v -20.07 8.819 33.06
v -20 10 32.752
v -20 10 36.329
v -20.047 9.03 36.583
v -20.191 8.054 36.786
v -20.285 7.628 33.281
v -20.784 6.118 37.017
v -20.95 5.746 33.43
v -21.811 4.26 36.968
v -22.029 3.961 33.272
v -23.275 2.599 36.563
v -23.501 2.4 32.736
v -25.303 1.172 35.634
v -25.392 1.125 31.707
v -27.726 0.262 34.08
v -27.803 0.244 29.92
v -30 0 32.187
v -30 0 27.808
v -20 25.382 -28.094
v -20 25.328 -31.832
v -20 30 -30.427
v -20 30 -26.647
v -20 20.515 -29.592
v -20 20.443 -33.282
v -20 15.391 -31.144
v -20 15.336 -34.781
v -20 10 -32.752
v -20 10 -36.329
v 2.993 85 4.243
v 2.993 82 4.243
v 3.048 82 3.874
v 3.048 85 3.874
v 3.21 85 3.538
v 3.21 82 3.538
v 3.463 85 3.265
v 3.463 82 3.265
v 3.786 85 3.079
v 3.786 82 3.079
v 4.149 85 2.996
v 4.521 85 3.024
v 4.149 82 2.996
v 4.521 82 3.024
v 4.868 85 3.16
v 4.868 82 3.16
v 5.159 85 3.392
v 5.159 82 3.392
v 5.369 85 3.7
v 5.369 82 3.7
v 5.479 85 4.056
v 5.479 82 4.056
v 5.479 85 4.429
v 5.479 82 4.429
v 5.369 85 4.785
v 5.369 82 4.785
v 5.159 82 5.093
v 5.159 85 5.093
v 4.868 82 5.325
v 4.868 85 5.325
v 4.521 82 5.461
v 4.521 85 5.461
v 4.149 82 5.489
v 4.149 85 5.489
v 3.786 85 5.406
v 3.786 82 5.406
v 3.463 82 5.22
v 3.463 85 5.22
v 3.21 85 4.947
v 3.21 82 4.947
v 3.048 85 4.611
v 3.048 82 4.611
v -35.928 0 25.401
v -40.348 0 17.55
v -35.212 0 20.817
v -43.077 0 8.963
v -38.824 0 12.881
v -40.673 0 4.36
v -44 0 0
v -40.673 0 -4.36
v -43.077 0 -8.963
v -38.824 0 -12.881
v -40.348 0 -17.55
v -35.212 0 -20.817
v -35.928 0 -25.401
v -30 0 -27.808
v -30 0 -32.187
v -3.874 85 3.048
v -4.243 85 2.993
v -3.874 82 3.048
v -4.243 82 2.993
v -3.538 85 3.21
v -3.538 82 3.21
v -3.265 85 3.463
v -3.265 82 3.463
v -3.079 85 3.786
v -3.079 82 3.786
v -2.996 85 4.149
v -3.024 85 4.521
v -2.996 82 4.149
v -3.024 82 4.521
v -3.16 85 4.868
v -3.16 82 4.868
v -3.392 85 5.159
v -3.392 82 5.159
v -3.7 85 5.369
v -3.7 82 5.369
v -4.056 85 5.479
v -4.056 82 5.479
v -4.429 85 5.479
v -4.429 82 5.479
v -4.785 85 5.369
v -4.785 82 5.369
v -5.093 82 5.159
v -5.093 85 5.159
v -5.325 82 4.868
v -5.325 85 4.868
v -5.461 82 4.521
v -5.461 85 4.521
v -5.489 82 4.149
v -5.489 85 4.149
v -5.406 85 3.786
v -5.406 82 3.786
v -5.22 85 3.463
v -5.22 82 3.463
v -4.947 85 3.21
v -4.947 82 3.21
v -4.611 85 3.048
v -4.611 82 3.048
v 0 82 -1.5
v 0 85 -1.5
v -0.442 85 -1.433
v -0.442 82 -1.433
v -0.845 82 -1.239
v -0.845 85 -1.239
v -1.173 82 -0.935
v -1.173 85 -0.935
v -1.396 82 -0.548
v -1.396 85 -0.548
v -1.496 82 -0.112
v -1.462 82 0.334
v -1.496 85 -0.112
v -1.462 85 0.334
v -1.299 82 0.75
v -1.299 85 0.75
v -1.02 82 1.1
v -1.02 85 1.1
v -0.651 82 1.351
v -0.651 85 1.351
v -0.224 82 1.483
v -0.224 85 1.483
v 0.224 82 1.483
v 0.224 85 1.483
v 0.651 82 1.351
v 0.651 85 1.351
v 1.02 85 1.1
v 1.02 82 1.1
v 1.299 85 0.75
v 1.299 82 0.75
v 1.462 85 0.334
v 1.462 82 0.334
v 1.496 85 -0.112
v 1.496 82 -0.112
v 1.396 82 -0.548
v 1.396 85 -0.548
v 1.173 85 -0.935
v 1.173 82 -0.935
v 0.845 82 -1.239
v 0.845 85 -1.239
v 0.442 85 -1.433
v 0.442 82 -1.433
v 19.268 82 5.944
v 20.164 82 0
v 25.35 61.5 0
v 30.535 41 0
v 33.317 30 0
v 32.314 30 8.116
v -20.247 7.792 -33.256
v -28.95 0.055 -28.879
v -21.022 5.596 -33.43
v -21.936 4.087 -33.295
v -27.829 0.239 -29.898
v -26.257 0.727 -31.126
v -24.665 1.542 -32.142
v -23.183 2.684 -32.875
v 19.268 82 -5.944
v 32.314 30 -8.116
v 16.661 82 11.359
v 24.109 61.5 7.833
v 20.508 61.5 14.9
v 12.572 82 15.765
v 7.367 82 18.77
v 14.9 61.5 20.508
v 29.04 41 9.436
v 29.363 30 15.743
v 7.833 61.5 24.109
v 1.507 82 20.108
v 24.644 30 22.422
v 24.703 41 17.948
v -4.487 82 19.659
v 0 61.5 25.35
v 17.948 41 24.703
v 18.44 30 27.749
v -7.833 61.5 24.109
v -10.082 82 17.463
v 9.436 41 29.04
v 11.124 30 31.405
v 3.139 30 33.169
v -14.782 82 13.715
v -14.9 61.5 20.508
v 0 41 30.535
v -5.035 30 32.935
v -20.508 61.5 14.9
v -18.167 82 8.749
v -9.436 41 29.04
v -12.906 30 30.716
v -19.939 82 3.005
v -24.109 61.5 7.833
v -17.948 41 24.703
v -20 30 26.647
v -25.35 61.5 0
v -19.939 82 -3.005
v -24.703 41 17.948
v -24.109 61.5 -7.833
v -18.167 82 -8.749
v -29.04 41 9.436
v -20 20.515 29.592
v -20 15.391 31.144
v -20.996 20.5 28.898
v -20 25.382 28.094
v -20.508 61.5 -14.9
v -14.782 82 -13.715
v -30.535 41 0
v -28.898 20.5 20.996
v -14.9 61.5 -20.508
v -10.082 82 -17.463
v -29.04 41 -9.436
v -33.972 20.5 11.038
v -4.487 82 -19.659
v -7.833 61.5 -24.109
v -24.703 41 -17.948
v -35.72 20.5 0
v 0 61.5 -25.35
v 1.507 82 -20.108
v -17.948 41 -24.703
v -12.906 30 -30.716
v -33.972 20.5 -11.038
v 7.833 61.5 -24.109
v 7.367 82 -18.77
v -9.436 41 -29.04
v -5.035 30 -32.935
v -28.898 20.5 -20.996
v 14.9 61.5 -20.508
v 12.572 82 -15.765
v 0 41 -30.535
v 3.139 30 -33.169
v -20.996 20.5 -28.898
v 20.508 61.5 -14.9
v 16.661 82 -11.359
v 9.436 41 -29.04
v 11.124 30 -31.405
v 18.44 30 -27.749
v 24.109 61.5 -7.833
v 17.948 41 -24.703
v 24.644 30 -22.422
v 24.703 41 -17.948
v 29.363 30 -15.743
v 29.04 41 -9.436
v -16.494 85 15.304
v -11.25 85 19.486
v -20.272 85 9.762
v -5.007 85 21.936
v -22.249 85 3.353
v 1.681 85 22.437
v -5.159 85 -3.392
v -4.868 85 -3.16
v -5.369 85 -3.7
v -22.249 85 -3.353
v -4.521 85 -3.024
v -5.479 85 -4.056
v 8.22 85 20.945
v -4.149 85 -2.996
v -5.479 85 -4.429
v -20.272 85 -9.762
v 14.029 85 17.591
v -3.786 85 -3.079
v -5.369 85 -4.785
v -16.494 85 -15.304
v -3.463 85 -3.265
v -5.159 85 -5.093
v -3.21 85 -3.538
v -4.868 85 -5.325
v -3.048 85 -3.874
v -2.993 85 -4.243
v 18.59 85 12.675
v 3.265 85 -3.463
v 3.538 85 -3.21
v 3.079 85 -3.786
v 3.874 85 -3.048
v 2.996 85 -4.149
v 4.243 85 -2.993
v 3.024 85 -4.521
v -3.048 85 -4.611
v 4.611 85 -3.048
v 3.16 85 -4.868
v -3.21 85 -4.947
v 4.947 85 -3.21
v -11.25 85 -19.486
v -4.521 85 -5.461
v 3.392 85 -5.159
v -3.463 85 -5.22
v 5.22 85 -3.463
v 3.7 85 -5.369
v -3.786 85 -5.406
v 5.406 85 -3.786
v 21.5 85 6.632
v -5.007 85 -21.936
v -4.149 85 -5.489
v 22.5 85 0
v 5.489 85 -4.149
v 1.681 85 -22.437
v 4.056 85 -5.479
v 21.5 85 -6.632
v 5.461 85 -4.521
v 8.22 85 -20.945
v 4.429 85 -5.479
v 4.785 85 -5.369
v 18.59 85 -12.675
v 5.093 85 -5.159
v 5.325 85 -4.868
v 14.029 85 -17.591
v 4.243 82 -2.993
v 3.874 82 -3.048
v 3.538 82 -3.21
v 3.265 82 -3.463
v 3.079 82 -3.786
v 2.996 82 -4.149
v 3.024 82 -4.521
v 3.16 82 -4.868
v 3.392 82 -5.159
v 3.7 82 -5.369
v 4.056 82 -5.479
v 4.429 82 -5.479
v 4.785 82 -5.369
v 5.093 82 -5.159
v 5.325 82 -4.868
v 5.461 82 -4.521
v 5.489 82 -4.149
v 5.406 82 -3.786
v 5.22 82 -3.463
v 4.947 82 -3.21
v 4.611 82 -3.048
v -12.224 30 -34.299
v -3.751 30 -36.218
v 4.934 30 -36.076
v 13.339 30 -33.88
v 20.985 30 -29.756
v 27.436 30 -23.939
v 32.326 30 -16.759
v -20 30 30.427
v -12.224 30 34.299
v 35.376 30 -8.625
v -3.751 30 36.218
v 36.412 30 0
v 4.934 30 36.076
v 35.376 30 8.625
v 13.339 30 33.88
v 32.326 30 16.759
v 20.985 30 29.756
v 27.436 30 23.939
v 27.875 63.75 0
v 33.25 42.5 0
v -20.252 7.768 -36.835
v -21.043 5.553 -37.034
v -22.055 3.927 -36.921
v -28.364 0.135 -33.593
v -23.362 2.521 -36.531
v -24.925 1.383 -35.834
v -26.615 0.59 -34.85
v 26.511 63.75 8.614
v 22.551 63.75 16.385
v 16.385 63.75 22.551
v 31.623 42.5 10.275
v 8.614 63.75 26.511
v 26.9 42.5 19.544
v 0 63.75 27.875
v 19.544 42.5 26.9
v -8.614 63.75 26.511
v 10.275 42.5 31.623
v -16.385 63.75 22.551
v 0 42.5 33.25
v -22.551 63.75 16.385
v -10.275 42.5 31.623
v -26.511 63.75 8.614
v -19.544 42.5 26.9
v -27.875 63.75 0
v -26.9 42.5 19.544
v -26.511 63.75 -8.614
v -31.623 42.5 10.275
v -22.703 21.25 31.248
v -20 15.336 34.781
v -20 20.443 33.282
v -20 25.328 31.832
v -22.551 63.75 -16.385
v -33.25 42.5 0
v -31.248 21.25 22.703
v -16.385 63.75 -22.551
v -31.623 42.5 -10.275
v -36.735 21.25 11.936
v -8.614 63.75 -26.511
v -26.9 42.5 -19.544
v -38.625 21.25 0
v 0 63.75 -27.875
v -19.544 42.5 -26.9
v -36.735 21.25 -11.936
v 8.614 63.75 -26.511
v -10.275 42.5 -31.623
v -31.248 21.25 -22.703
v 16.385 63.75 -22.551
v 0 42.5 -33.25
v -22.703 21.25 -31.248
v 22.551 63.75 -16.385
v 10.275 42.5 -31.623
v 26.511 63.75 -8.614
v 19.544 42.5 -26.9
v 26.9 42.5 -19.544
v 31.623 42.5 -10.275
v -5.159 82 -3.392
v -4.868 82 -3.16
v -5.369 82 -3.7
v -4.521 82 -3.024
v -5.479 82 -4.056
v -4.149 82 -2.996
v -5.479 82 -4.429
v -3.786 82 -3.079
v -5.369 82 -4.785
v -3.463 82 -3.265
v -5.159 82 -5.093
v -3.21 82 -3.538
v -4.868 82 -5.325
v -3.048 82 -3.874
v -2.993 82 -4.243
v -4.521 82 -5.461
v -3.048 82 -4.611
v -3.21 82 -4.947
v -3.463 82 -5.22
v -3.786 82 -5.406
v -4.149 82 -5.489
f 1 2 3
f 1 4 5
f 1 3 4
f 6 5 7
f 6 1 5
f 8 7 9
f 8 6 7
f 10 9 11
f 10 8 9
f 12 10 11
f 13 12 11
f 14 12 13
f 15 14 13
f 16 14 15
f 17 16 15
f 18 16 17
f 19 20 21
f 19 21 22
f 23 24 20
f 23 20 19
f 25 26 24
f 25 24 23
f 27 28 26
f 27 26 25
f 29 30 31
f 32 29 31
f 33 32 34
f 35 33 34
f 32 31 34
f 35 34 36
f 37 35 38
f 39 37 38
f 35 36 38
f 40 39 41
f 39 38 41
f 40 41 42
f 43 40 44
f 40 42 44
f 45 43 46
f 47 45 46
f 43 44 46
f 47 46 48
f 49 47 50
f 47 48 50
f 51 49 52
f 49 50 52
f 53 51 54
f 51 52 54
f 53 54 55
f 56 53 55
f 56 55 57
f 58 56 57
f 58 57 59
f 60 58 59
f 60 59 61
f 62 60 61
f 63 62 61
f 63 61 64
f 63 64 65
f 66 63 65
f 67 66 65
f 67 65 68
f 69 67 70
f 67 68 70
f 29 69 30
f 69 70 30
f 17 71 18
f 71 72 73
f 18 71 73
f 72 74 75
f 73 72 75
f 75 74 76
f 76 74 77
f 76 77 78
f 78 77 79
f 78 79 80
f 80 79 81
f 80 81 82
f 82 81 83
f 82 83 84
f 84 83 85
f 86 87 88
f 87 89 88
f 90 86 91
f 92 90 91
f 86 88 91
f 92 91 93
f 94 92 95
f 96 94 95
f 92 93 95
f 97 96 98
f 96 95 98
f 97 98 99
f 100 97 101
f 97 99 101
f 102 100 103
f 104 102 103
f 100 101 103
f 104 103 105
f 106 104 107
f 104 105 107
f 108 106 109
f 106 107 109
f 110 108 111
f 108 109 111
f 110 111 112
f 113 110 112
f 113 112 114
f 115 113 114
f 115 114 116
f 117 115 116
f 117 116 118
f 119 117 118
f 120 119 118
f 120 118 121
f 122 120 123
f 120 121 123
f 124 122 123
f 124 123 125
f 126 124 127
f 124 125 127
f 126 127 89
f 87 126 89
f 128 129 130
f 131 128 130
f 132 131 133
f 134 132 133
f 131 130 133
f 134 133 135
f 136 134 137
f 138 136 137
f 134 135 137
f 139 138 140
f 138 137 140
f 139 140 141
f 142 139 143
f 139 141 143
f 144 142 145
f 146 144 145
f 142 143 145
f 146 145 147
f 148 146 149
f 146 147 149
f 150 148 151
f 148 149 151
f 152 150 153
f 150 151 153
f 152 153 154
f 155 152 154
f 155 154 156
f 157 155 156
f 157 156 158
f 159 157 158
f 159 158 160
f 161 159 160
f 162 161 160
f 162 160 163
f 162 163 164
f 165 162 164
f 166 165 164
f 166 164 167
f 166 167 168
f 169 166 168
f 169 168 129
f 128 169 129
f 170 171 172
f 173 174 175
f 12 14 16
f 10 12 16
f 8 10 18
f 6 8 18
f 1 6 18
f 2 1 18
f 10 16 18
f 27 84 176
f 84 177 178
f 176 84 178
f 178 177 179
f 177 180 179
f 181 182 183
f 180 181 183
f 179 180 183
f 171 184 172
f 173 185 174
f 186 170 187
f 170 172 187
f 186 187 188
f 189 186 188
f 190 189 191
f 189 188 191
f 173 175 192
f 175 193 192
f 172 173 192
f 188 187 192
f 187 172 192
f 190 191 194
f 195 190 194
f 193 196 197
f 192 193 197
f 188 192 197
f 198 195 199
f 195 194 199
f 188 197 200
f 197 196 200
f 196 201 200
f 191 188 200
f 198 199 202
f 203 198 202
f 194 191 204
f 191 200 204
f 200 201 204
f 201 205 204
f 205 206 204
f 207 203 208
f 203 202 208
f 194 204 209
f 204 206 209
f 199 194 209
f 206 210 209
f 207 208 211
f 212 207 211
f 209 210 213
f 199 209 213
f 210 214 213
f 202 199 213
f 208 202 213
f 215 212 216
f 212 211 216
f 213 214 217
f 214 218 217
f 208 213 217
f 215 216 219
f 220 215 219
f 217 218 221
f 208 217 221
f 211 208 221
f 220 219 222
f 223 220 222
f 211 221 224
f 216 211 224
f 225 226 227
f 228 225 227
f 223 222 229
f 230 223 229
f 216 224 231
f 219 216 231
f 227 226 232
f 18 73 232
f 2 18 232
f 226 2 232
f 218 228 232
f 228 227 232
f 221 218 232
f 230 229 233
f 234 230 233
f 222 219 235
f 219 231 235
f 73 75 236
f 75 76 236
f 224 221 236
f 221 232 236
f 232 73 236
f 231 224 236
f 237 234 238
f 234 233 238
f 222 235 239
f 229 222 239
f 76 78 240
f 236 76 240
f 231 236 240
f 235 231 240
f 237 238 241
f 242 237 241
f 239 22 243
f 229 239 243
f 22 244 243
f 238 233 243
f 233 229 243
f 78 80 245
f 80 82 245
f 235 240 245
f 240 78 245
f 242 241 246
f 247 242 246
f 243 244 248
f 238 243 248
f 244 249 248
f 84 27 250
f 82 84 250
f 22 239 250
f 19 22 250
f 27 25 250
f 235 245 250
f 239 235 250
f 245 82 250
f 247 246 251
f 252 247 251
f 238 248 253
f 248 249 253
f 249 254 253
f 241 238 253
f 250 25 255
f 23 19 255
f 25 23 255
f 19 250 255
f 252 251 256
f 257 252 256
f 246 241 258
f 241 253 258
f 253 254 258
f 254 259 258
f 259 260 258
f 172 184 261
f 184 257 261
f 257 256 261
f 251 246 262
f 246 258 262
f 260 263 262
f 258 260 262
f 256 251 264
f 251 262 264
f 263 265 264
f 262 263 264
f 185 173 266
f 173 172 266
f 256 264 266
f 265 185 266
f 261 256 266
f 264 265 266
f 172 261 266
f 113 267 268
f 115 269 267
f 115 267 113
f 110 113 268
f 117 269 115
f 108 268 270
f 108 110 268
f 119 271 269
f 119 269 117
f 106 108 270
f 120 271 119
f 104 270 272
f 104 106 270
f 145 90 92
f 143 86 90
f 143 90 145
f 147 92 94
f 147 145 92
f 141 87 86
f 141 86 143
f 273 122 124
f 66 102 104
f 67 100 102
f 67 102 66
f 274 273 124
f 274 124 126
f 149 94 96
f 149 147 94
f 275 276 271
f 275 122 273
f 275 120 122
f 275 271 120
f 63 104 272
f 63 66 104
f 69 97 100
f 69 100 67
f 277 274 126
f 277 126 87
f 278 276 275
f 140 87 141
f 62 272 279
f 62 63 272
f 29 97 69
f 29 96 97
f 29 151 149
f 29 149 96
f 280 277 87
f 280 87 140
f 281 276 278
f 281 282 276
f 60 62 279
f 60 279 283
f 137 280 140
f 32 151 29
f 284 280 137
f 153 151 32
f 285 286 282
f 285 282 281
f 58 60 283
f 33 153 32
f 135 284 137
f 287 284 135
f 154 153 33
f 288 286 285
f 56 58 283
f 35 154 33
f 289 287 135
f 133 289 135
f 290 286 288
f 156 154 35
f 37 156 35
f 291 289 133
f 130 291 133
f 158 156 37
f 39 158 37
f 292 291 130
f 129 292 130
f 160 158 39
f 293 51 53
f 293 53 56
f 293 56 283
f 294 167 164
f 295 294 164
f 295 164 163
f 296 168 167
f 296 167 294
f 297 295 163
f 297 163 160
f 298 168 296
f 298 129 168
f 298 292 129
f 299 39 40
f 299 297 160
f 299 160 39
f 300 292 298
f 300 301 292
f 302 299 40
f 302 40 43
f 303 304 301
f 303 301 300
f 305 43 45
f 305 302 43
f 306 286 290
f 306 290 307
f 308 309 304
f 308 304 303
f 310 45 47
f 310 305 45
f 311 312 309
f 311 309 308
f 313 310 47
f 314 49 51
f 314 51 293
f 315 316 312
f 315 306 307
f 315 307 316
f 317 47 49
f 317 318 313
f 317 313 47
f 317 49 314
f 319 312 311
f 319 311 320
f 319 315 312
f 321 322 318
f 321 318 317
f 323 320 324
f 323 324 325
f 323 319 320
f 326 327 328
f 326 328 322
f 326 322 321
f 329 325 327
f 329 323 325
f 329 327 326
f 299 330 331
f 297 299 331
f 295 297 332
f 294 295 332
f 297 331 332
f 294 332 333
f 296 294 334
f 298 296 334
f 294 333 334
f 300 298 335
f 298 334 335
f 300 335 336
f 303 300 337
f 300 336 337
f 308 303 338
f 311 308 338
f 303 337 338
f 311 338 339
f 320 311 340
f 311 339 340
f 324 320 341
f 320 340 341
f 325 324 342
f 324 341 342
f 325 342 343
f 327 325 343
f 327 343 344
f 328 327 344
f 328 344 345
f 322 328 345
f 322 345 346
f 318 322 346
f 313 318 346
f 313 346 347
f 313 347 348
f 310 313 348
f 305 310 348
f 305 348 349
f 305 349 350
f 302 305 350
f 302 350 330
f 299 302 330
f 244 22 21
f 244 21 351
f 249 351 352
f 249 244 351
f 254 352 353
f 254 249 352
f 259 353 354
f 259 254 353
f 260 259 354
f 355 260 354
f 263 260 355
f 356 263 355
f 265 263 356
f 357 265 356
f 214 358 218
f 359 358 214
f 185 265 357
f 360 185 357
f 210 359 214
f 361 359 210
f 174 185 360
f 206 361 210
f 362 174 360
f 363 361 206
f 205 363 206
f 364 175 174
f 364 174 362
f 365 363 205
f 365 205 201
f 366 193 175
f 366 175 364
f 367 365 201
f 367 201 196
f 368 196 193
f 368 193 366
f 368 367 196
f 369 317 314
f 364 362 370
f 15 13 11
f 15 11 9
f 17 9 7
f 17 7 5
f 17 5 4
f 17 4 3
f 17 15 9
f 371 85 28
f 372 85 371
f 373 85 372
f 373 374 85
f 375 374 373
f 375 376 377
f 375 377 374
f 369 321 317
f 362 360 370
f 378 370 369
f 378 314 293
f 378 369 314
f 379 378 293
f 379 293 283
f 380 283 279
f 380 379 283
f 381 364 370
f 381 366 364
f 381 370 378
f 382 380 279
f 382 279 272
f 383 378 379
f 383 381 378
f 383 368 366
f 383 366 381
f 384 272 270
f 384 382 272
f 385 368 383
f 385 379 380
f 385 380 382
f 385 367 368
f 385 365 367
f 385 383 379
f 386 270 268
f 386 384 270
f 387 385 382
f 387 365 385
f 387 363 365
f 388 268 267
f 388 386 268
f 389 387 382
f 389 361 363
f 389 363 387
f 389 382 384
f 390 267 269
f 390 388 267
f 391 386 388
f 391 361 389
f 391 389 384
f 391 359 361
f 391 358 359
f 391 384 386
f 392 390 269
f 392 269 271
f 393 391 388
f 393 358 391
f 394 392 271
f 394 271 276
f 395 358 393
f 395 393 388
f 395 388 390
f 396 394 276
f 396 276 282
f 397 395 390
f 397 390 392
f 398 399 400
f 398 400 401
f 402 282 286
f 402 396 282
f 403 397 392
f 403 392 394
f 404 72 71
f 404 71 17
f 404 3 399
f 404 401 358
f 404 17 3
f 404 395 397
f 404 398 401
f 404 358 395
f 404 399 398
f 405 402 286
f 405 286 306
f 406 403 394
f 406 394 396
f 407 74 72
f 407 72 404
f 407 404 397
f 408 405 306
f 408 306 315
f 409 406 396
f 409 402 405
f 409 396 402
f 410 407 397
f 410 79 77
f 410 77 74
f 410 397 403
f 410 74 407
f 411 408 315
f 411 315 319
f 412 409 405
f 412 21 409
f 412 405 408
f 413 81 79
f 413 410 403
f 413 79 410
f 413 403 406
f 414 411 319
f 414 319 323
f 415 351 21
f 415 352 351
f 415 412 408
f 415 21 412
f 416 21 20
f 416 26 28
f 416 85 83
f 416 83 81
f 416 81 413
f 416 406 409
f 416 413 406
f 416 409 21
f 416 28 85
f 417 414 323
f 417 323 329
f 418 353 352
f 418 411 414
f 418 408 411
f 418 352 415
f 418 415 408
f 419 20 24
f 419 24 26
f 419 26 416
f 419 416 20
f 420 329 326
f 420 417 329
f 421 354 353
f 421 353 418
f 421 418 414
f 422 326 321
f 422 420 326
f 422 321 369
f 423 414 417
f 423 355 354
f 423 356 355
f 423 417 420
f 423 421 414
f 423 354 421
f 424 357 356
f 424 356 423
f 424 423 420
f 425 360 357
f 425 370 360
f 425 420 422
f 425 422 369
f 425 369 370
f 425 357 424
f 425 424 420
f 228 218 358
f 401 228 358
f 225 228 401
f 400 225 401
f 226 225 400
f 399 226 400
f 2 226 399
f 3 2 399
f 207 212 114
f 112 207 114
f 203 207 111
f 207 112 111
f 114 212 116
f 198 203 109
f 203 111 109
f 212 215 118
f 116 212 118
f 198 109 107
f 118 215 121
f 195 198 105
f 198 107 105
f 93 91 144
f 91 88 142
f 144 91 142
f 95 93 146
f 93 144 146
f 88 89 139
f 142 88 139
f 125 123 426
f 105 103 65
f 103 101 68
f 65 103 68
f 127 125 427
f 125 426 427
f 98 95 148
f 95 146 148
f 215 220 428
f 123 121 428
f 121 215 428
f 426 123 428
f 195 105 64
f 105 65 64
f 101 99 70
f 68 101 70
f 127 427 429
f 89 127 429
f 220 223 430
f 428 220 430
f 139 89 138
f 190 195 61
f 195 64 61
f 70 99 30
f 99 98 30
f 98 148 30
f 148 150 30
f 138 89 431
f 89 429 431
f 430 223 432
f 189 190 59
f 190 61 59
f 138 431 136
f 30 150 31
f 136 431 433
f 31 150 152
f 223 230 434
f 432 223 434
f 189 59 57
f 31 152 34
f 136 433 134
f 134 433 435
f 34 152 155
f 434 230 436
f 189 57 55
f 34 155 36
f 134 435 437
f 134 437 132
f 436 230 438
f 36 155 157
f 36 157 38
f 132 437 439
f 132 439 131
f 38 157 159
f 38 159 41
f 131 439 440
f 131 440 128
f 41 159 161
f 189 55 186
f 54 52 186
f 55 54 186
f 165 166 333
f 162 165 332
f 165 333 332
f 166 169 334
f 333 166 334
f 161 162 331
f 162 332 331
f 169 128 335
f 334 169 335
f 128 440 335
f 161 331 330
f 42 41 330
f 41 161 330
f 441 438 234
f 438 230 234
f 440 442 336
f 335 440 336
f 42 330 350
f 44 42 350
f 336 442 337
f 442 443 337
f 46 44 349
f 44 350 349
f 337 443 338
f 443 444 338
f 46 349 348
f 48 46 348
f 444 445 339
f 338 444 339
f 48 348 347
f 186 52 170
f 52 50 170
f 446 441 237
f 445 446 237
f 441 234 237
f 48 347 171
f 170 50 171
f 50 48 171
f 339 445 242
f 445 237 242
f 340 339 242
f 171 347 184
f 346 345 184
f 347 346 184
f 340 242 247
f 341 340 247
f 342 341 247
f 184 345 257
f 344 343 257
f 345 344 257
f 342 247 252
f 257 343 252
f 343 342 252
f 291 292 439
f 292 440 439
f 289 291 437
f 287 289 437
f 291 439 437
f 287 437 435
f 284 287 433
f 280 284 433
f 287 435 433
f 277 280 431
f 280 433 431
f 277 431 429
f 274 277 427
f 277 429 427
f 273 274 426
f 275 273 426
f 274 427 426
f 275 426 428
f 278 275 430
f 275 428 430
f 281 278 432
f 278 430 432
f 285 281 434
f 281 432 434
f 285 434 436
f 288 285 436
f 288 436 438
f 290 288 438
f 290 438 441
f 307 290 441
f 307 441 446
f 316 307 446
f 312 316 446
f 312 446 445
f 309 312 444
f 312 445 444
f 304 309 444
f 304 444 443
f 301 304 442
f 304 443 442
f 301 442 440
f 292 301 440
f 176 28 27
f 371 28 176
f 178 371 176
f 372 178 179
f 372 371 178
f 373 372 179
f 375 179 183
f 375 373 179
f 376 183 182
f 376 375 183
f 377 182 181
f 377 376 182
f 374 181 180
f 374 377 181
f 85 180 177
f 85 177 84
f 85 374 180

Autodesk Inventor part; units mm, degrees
ref_plane "YZ Plane" through (0, 0, 0) normal (1, 0, 0) x (0, 1, 0)
ref_plane "XZ Plane" through (0, 0, 0) normal (0, 1, 0) x (-1, 0, 0)
ref_plane "XY Plane" through (0, 0, 0) normal (0, 0, 1) x (1, 0, 0)
sketch "スケッチ8" plane through (0, 0, 0) normal (0, 0, 1) x (1, 0, 0)
  line L0 (0, 0) -> (0, 85)
  line L1 (0, 85) -> (22.5, 85)
  line L2 (22.5, 85) -> (44, 0)
  line L3 (44, 0) -> (0, 0)
  dimension "d14" = 22.5
  dimension "d15" = 44
  dimension "d16" = 85
revolve "回転1" add sketch "スケッチ8" angle 360 about axis through (0, 0, 0) along (0, 1, 0)
shell "シェル2" thickness 3 removed faces 1 at (-13.3987, 0, -0.1333)
sketch "スケッチ9" plane through (0, 82, 0) normal (0, -1, 0) x (1, 0, 0)
  circle A0 centre (0, 0) radius 1.5
  dimension "d29" = 3
hole "穴2" at (0, 82, 0) direction (0, 1, 0) diameter 3 end through all
sketch "スケッチ16" plane through (0, 0, 0) normal (0, -1, 0) x (1, 0, 0)
  line L0 (80, -50) -> (-20, -50)
  line L1 (-20, -50) -> (-20, 50)
  line L2 (-20, 50) -> (80, 50)
  line L3 (80, 50) -> (80, -50)
  point P0 (0, 0)
  dimension "d66" = 100
  dimension "d67" = 100
  dimension "d68" = 50
  dimension "d69" = 20
extrude "押し出し6" cut sketch "スケッチ16" against normal blind 30
fillet "フィレット3" radius 10 2 edges at (-20, 0, -37.4373) (-20, 0, 37.4373)
sketch "スケッチ17" plane through (0, 82, 0) normal (0, -1, 0) x (1, 0, 0)
  line L0 (0, 0) -> (-4.2426, -4.2426)
  line L1 (0, 0) -> (6, 0) construction
  circle A0 centre (-4.2426, -4.2426) radius 1.25
  dimension "d73" = 6
  dimension "d74" = 135
  dimension "d75" = 2.5
extrude "押し出し7" cut sketch "スケッチ17" against normal blind 30
pattern_circular "円形状パターン2" count 4 over 360 about axis through (0, 232.7083, 0) along (0, -1, 0) of "押し出し7"
properties part number "ball受け" material "ABS プラスチック"
